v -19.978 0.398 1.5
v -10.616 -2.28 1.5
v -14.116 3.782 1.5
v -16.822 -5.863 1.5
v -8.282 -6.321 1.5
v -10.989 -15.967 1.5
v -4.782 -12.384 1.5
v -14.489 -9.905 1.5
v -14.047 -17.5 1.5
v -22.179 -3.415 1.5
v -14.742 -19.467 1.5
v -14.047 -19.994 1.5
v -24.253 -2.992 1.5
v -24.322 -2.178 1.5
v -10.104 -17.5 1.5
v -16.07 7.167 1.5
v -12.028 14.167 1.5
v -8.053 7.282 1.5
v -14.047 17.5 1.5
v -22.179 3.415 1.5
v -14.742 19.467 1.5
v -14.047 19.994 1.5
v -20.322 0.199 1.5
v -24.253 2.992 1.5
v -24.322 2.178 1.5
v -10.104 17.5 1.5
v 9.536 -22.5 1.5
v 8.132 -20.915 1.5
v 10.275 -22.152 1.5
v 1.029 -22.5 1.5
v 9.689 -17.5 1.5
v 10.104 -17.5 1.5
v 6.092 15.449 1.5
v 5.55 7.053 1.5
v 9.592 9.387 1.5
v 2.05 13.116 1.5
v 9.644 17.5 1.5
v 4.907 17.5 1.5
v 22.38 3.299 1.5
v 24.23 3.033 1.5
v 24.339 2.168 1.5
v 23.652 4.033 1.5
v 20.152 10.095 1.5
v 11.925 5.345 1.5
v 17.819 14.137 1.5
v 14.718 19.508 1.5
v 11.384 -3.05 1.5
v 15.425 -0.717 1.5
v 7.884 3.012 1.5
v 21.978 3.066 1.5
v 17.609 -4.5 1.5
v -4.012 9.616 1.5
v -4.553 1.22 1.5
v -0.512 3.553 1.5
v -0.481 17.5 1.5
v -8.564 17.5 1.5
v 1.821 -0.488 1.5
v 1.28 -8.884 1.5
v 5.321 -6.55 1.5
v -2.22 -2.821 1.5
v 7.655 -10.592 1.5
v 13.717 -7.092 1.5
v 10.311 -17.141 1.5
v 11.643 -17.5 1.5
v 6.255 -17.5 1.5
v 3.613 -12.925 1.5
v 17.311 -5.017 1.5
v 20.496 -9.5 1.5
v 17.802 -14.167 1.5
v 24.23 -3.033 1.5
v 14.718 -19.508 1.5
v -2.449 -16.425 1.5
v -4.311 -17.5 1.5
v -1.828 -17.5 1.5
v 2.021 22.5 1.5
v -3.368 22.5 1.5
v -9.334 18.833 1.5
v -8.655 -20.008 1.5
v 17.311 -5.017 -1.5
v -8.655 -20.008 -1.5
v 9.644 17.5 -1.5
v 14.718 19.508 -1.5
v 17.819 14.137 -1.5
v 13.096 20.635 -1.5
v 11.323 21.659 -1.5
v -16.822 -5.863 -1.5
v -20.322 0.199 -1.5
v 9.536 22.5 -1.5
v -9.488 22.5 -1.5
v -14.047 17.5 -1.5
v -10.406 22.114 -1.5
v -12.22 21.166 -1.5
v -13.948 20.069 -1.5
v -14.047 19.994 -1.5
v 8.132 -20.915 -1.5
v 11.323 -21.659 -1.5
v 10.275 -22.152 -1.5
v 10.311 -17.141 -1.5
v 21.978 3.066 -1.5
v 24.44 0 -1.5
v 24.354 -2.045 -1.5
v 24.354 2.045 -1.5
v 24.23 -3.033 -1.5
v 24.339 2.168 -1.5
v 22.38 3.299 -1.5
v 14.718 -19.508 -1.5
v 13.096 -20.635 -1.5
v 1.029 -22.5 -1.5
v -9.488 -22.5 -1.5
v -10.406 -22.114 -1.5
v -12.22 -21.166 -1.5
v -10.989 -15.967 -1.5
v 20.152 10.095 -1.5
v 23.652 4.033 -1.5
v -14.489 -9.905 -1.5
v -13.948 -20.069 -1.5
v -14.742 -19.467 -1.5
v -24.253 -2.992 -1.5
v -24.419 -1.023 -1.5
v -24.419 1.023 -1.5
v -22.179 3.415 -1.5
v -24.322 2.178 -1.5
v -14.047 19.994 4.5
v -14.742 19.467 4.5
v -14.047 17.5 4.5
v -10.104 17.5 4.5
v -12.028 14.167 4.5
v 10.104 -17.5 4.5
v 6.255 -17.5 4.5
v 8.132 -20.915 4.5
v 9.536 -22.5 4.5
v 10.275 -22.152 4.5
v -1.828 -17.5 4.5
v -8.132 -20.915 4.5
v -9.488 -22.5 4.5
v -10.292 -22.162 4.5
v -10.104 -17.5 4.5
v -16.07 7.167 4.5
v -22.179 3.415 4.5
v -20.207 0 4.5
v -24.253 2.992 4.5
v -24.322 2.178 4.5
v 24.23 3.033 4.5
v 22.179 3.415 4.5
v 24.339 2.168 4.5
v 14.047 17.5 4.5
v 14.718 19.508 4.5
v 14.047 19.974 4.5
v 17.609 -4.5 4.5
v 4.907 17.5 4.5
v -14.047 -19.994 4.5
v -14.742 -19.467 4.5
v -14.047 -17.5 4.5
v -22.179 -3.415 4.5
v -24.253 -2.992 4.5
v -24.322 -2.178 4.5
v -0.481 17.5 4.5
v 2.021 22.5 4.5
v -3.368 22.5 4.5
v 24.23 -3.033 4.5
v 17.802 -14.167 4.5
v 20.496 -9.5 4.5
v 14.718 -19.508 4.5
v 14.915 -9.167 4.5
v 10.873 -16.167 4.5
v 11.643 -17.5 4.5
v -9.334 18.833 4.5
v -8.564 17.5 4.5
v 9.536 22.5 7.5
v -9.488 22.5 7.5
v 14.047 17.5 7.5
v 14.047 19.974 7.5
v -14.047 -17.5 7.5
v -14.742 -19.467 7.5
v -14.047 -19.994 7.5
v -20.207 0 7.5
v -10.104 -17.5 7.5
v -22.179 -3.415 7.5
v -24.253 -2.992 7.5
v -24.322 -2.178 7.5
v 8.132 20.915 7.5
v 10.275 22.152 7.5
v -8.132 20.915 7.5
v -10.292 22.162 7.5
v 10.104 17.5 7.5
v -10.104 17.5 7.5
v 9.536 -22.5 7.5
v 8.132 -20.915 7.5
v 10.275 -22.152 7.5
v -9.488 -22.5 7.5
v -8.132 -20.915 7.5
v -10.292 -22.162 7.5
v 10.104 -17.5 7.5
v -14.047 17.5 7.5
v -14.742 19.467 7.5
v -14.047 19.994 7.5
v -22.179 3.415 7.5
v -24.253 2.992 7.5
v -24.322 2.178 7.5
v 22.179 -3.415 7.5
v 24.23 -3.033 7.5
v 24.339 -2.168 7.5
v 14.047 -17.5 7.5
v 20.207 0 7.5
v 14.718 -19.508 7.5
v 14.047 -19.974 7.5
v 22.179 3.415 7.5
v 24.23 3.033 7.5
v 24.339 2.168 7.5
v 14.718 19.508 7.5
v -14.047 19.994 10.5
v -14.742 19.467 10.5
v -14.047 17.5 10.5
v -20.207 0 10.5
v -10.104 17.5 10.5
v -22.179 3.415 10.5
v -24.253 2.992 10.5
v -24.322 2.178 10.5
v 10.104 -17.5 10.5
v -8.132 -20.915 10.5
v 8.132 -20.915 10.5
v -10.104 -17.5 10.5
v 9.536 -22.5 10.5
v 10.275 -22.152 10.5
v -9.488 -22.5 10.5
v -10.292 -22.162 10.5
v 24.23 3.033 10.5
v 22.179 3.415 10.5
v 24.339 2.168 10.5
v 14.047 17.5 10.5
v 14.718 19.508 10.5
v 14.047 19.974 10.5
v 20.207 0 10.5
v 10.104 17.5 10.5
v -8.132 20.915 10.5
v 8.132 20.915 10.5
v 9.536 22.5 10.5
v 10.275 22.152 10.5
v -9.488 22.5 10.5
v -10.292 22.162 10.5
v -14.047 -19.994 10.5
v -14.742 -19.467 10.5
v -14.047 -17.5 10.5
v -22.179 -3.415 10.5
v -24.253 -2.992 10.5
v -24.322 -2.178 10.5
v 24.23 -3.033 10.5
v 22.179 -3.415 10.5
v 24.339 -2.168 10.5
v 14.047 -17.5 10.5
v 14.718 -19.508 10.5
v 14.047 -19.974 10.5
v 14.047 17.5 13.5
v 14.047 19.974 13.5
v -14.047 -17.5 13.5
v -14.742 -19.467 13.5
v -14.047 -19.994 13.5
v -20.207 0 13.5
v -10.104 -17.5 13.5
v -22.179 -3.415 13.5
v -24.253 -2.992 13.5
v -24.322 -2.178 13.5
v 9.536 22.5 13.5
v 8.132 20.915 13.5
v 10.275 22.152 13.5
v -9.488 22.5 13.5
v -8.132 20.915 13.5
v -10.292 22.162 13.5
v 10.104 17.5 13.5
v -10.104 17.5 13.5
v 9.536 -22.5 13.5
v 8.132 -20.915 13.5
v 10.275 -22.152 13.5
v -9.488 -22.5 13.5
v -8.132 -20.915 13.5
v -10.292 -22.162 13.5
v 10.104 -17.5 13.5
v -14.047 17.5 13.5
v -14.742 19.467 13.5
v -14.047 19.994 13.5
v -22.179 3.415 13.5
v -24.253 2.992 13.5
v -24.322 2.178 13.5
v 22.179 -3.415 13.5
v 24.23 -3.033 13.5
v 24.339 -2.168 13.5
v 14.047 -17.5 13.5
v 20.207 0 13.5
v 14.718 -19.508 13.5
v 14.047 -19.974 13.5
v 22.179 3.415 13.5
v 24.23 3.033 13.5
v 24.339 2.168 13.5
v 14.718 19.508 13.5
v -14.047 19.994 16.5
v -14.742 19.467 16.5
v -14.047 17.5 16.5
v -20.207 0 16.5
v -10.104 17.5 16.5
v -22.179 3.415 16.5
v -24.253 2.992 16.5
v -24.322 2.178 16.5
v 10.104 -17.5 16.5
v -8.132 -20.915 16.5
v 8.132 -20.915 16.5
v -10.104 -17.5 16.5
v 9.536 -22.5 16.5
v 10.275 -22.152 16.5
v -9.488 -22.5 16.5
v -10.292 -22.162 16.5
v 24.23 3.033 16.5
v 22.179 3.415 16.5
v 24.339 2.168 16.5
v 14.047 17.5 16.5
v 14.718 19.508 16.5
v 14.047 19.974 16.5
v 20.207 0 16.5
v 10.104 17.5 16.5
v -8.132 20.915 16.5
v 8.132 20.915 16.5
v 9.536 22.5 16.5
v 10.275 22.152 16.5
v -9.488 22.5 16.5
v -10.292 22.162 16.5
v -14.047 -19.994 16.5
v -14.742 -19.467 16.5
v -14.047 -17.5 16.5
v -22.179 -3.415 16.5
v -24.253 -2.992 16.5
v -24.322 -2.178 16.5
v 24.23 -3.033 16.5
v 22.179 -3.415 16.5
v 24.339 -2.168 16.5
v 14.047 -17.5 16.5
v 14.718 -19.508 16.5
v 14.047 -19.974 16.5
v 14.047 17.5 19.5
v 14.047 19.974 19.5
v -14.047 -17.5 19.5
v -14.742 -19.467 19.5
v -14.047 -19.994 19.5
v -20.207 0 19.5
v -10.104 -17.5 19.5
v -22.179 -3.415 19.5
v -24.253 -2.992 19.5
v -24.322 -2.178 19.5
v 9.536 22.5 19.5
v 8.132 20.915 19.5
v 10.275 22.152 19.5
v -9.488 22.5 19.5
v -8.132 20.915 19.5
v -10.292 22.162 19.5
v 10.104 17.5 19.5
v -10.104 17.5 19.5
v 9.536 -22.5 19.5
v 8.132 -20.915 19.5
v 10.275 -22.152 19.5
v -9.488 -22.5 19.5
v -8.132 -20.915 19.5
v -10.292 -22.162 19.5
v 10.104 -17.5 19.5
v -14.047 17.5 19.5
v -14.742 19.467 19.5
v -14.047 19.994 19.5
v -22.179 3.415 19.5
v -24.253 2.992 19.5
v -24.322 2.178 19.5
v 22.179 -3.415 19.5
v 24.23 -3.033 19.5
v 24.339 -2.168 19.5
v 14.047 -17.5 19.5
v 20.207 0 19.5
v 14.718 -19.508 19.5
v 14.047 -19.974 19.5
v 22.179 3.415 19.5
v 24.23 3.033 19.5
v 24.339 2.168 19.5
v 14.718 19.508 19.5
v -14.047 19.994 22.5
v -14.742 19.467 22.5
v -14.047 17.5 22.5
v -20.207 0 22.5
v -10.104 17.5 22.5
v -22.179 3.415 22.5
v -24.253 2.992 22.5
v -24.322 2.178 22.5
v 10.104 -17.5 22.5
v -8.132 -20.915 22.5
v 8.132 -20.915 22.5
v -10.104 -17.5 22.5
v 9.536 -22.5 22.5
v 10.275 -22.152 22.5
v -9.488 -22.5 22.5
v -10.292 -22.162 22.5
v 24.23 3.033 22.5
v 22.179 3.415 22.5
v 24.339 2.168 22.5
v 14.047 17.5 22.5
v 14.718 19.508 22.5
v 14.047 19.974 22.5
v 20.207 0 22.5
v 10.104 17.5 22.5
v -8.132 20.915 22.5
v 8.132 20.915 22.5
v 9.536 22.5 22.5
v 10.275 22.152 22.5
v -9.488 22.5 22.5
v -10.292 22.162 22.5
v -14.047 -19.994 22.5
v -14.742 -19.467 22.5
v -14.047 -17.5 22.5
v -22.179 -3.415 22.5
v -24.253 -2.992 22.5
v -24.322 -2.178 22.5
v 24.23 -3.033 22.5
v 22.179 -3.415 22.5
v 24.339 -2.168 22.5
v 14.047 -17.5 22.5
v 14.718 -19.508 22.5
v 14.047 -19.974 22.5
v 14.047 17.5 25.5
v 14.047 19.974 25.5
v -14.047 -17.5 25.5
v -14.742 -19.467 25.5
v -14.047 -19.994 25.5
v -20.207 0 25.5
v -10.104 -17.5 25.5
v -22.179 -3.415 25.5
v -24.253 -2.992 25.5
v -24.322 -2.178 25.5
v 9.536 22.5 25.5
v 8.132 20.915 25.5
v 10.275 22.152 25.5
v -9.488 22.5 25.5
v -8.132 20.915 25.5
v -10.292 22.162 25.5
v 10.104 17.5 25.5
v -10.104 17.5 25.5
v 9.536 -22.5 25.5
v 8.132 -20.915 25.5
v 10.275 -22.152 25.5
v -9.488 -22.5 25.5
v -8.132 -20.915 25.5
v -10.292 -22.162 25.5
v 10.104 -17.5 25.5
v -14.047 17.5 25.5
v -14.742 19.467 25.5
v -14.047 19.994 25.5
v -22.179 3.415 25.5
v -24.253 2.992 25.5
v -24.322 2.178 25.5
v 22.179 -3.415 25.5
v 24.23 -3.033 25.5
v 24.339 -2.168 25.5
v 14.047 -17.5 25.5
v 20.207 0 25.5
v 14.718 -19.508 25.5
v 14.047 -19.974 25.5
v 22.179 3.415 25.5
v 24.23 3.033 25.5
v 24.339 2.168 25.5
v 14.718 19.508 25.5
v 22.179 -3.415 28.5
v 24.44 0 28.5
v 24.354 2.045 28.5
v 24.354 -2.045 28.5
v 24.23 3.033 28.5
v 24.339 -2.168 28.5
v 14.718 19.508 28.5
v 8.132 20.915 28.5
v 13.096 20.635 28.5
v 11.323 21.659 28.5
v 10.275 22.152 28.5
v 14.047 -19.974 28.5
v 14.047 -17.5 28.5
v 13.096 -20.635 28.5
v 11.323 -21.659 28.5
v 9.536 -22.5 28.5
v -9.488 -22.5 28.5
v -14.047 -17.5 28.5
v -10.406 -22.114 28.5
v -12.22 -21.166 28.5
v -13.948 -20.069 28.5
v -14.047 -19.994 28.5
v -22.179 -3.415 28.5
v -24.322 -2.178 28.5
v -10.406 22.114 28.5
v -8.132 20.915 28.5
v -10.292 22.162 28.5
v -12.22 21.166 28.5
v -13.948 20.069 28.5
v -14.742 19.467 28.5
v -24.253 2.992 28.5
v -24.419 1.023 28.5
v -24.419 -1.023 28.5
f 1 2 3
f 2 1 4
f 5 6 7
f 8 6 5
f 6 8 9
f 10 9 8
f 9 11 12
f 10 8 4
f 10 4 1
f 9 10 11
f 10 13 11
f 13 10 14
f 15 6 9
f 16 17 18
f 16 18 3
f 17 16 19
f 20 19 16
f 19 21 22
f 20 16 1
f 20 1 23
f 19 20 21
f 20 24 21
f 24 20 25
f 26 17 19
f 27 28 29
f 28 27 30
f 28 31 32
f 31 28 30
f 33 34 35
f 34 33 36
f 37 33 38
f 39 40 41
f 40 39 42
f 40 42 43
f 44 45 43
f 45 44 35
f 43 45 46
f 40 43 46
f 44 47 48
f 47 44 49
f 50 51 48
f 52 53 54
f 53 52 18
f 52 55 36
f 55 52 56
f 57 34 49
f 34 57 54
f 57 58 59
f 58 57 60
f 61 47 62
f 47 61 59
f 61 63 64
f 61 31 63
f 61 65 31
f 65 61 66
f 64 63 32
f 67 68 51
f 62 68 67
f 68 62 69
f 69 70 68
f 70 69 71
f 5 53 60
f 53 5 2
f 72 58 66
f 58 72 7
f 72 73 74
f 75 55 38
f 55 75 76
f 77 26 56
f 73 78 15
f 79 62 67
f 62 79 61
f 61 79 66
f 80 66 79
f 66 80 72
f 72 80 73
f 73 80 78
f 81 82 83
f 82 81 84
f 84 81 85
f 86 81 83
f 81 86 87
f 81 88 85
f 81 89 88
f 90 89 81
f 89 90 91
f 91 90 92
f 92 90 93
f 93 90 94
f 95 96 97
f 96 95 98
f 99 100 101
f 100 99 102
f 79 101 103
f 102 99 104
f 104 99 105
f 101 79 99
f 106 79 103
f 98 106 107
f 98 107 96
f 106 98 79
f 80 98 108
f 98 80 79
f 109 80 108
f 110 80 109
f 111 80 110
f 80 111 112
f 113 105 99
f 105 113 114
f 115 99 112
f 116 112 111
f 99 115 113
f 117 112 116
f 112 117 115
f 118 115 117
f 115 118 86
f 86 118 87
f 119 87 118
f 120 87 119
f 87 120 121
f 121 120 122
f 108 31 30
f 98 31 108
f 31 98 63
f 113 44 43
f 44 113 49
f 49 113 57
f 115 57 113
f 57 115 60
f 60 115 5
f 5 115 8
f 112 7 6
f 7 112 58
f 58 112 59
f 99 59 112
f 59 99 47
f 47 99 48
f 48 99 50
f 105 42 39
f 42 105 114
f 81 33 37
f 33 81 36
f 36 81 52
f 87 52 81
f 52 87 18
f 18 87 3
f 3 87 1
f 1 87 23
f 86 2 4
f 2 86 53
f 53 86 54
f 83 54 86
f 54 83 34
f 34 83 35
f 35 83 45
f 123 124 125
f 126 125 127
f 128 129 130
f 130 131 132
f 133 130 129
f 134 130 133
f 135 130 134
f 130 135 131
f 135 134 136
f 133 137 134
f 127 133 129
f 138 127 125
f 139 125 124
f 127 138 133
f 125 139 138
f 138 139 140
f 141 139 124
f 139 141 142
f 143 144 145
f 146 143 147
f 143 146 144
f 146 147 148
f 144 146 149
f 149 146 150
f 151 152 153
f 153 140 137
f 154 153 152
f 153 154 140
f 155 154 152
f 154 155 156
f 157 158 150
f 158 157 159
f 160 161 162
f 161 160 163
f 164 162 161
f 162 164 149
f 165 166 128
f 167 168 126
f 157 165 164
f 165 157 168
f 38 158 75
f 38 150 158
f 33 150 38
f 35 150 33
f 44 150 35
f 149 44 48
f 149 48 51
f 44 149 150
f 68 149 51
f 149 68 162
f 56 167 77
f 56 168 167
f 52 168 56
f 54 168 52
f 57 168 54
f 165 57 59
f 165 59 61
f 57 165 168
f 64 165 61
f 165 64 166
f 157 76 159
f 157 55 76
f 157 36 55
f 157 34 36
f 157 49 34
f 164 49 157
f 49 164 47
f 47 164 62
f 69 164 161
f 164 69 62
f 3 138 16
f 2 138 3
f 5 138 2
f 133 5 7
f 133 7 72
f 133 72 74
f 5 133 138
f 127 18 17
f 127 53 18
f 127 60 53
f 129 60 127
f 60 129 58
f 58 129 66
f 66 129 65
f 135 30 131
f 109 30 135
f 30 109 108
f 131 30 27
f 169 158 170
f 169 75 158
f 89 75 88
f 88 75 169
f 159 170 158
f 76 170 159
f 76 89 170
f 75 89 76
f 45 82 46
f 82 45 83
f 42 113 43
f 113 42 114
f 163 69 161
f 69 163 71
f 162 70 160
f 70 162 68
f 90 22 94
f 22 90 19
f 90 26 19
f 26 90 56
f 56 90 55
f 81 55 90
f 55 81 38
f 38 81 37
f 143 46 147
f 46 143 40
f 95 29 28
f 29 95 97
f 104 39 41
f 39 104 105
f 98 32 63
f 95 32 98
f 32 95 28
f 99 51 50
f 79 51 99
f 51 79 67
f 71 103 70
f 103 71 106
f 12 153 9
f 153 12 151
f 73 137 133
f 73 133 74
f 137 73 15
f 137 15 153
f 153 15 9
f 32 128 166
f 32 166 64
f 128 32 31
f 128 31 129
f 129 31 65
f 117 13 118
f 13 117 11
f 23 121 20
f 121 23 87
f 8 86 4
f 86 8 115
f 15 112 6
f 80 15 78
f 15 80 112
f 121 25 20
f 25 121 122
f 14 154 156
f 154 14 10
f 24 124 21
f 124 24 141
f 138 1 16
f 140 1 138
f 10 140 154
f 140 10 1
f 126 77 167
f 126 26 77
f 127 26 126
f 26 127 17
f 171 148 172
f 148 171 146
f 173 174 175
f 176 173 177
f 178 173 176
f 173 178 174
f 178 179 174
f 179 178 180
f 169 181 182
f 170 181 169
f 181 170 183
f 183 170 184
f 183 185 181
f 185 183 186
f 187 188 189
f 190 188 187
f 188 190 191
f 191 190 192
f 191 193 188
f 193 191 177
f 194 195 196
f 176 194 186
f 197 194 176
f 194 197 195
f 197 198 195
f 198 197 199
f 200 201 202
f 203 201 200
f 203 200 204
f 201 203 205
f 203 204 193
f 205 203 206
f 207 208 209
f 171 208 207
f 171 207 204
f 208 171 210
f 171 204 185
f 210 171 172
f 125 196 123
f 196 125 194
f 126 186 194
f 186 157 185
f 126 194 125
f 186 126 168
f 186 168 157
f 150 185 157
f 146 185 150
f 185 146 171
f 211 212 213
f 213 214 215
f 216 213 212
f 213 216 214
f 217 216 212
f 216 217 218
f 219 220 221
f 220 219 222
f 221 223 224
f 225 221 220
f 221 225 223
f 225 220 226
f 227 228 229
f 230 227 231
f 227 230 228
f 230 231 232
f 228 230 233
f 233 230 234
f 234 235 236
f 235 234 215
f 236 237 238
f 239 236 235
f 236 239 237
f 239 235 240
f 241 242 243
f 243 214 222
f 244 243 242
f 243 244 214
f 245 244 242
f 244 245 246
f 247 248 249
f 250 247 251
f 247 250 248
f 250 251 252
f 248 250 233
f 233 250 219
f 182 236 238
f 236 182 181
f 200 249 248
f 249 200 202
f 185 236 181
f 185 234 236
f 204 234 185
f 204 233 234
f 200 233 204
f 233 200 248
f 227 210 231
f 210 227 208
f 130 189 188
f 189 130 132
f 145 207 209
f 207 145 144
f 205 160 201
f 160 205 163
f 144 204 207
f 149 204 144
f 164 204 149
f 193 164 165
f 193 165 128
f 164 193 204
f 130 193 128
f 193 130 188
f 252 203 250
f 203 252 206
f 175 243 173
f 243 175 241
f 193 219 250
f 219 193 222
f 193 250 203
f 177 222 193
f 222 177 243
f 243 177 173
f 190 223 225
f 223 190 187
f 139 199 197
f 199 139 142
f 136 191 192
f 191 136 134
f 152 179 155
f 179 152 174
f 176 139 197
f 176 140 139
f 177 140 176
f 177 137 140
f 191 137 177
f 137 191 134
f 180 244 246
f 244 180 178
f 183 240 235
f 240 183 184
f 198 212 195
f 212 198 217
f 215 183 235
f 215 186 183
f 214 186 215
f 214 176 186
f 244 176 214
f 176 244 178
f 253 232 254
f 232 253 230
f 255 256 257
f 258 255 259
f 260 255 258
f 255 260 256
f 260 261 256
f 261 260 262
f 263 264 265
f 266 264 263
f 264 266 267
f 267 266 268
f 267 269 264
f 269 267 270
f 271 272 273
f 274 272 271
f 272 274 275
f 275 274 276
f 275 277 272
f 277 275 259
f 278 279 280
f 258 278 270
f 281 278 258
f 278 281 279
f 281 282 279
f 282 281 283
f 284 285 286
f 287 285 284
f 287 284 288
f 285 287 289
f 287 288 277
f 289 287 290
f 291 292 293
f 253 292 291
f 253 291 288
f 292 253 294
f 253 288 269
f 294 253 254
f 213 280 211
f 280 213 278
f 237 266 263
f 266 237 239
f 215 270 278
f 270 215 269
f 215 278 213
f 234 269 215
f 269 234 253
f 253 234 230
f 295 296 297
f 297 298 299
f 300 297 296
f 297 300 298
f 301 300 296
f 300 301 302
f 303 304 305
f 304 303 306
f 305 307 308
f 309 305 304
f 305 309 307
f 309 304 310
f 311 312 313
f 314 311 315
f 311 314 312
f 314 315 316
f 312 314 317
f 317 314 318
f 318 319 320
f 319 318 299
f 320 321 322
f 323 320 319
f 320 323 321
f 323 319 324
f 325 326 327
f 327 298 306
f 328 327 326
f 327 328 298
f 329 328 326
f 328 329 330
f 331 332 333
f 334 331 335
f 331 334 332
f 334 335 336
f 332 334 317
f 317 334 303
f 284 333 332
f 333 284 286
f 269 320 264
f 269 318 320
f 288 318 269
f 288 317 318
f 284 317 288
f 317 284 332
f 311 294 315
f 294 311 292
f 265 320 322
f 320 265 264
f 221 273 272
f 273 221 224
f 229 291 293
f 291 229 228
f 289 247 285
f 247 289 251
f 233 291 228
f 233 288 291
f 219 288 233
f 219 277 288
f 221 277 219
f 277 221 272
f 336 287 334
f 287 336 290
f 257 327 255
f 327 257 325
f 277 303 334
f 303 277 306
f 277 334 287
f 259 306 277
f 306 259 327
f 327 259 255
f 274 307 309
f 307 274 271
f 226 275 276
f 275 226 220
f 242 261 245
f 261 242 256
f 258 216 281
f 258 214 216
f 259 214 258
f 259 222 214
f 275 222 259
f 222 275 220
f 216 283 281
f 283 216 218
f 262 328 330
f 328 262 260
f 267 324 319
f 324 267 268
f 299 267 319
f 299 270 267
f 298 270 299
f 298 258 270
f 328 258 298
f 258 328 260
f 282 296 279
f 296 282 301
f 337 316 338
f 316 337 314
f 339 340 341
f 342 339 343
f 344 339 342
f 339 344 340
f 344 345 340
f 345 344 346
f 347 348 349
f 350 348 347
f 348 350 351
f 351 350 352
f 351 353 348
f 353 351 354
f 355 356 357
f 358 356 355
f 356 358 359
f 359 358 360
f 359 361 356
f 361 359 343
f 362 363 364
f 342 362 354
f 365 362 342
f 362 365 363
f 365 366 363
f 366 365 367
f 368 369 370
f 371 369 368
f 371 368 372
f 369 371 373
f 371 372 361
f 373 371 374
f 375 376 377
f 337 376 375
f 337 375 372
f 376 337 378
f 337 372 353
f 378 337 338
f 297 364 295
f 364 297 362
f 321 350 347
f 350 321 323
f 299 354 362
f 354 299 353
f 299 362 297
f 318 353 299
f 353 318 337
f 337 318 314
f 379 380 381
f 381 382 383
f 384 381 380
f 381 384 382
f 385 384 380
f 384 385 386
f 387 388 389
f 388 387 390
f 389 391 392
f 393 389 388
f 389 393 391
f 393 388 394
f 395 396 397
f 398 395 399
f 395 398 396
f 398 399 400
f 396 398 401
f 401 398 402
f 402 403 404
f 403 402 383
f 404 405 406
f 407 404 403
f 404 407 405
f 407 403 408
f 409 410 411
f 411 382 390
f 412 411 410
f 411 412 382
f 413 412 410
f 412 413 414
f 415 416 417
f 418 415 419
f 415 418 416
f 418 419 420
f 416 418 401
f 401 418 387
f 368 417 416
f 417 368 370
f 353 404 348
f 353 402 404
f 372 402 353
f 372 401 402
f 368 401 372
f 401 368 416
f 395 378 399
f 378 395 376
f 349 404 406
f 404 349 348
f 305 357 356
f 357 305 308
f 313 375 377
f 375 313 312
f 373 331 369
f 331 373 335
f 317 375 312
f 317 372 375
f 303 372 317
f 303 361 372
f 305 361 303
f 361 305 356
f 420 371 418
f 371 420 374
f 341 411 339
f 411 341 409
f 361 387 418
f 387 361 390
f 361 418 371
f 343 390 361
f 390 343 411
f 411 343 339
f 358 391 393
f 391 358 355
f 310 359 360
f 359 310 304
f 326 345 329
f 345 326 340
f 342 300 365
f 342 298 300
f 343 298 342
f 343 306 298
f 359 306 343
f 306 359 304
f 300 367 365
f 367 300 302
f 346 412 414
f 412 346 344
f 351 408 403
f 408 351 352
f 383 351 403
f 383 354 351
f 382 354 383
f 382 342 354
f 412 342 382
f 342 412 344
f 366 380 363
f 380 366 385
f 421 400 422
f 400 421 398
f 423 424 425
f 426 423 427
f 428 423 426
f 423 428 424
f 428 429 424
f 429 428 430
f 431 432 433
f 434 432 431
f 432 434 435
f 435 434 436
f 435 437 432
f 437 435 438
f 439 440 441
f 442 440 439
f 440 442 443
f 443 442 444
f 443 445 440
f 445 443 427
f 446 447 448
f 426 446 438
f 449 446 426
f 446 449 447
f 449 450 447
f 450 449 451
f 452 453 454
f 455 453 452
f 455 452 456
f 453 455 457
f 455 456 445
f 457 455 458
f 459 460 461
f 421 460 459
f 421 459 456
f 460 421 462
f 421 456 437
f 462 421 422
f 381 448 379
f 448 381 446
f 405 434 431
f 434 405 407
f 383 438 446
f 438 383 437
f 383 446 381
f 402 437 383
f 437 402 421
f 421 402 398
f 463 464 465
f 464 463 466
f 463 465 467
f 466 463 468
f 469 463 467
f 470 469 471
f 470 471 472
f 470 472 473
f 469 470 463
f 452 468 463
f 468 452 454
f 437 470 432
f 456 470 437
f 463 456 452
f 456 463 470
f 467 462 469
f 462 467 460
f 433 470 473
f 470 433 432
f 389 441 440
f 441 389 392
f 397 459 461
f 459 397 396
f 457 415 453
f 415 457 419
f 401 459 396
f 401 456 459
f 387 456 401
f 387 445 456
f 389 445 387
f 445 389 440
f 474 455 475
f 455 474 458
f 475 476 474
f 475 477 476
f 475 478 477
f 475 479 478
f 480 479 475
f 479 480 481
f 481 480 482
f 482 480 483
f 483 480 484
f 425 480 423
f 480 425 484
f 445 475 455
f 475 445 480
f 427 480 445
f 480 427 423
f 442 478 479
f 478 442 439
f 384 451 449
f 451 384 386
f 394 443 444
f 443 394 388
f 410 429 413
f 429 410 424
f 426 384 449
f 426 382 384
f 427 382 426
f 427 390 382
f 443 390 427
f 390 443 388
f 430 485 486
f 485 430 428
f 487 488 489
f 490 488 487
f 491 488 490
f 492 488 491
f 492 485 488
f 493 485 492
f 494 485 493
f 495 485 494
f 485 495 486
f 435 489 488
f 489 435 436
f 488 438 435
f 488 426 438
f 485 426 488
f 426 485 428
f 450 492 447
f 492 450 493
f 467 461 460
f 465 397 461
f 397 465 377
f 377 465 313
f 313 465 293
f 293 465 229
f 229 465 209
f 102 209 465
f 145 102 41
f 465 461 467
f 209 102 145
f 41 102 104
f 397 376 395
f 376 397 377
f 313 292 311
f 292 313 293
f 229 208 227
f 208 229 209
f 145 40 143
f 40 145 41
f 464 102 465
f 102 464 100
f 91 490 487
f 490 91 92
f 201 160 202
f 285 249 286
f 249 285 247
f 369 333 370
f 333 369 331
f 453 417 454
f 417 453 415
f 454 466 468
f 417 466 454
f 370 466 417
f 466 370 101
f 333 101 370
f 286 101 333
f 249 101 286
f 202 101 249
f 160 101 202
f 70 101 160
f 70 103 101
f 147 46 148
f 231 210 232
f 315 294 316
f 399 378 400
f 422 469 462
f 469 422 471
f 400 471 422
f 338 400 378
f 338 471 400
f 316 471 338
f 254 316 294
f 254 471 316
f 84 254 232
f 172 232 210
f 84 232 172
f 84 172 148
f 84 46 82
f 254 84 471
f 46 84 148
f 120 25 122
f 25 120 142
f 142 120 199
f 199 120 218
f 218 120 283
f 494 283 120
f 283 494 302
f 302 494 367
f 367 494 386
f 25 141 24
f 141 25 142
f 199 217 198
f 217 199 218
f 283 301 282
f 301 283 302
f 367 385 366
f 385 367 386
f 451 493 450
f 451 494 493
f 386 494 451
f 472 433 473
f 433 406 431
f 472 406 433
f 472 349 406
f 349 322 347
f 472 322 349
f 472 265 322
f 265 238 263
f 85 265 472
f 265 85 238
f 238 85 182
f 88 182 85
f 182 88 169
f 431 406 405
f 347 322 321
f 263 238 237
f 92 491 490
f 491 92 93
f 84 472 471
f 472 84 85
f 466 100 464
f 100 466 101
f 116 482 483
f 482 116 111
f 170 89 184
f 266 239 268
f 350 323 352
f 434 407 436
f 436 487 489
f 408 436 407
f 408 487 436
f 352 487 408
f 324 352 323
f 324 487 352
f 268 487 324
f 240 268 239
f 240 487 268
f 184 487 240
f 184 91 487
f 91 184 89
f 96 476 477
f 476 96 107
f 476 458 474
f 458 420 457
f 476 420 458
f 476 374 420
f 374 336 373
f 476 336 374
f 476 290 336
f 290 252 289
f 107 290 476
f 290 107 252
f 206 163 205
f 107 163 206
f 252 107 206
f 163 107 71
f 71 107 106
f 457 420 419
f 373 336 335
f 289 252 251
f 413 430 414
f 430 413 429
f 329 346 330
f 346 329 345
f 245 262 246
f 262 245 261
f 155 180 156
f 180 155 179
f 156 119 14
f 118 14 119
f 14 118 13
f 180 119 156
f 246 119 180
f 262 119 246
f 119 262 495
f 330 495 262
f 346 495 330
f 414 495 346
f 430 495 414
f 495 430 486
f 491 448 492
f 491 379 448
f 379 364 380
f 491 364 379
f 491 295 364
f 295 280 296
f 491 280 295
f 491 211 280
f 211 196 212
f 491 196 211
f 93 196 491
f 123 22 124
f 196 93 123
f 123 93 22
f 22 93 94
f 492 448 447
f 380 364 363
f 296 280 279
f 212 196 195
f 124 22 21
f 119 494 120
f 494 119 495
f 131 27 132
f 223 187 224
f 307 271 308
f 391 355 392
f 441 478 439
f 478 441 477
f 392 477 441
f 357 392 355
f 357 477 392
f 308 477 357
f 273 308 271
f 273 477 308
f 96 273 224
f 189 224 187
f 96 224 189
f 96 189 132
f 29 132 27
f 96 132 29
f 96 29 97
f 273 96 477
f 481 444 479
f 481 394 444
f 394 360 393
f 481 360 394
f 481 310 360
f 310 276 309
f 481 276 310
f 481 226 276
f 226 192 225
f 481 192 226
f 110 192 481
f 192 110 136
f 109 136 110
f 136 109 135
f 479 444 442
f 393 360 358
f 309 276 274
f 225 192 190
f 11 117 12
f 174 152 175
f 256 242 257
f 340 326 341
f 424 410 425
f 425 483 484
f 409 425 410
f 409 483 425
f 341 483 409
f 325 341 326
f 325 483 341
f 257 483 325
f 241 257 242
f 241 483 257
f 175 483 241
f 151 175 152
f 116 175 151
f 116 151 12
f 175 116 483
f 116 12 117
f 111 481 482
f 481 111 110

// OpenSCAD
$fn = 75;

difference() {
	union() {
		union() {
			union() {
				union() {
					union() {
						union() {
							union() {
								union() {
									union() {
										union() {
											union() {
												union() {
													union() {
														union() {
															union() {
																union() {
																	union() {
																		union() {
																			union() {
																				union() {
																					union() {
																						union() {
																							union() {
																								union() {
																									union() {
																										union() {
																											union() {
																												union() {
																													union() {
																														union() {
																															difference() {
																																union() {
																																	union() {
																																		union() {
																																			union() {
																																				union() {
																																					union() {
																																						rotate(a = 30.0000000000) {
																																							translate(v = [0, -16.5000000000, 0.0000000000]) {
																																								cube(center = true, size = [67.0000000000, 7.0000000000, 3.0000000000]);
																																							}
																																						}
																																					}
																																					rotate(a = 30.0000000000) {
																																						translate(v = [0, -4.8333333333, 0.0000000000]) {
																																							cube(center = true, size = [67.0000000000, 7.0000000000, 3.0000000000]);
																																						}
																																					}
																																				}
																																				rotate(a = 30.0000000000) {
																																					translate(v = [0, 6.8333333333, 0.0000000000]) {
																																						cube(center = true, size = [67.0000000000, 7.0000000000, 3.0000000000]);
																																					}
																																				}
																																			}
																																			rotate(a = 120.0000000000) {
																																				translate(v = [0, -16.5000000000, 3.0000000000]) {
																																					cube(center = true, size = [67.0000000000, 7.0000000000, 3.0000000000]);
																																				}
																																			}
																																		}
																																		rotate(a = 120.0000000000) {
																																			translate(v = [0, -4.8333333333, 3.0000000000]) {
																																				cube(center = true, size = [67.0000000000, 7.0000000000, 3.0000000000]);
																																			}
																																		}
																																	}
																																	rotate(a = 120.0000000000) {
																																		translate(v = [0, 6.8333333333, 3.0000000000]) {
																																			cube(center = true, size = [67.0000000000, 7.0000000000, 3.0000000000]);
																																		}
																																	}
																																}
																																difference() {
																																	cube(center = true, size = [80, 97.7603895452, 60]);
																																	rotate(a = -90.0000000000) {
																																		cube(center = true, size = [45.0000000000, 48.8801947726, 90]);
																																	}
																																}
																																difference() {
																																	cube(center = true, size = [80, 97.7603895452, 60]);
																																	rotate(a = 30.0000000000) {
																																		cube(center = true, size = [45.0000000000, 48.8801947726, 90]);
																																	}
																																}
																																difference() {
																																	cube(center = true, size = [80, 97.7603895452, 60]);
																																	rotate(a = 150.0000000000) {
																																		cube(center = true, size = [45.0000000000, 48.8801947726, 90]);
																																	}
																																}
																																difference() {
																																	cube(center = true, size = [80, 97.7603895452, 60]);
																																	rotate(a = 270.0000000000) {
																																		cube(center = true, size = [45.0000000000, 48.8801947726, 90]);
																																	}
																																}
																																difference() {
																																	cube(center = true, size = [80, 97.7603895452, 60]);
																																	rotate(a = 390.0000000000) {
																																		cube(center = true, size = [45.0000000000, 48.8801947726, 90]);
																																	}
																																}
																																difference() {
																																	cube(center = true, size = [80, 97.7603895452, 60]);
																																	rotate(a = 510.0000000000) {
																																		cube(center = true, size = [45.0000000000, 48.8801947726, 90]);
																																	}
																																}
																															}
																															rotate(a = 0.0000000000) {
																																translate(v = [0, 20, 0.0000000000]) {
																																	cube(center = true, size = [28.0940107676, 5, 3.0000000000]);
																																}
																															}
																														}
																														rotate(a = 120.0000000000) {
																															translate(v = [0, -20, 3.0000000000]) {
																																cube(center = true, size = [28.0940107676, 5, 3.0000000000]);
																															}
																														}
																													}
																													rotate(a = 240.0000000000) {
																														translate(v = [0, 20, 0.0000000000]) {
																															cube(center = true, size = [28.0940107676, 5, 3.0000000000]);
																														}
																													}
																												}
																												rotate(a = 360.0000000000) {
																													translate(v = [0, -20, 3.0000000000]) {
																														cube(center = true, size = [28.0940107676, 5, 3.0000000000]);
																													}
																												}
																											}
																											rotate(a = 480.0000000000) {
																												translate(v = [0, 20, 0.0000000000]) {
																													cube(center = true, size = [28.0940107676, 5, 3.0000000000]);
																												}
																											}
																										}
																										rotate(a = 600.0000000000) {
																											translate(v = [0, -20, 3.0000000000]) {
																												cube(center = true, size = [28.0940107676, 5, 3.0000000000]);
																											}
																										}
																									}
																									rotate(a = 0.0000000000) {
																										translate(v = [0, 20, 6.0000000000]) {
																											cube(center = true, size = [28.0940107676, 5, 3.0000000000]);
																										}
																									}
																								}
																								rotate(a = 120.0000000000) {
																									translate(v = [0, -20, 9.0000000000]) {
																										cube(center = true, size = [28.0940107676, 5, 3.0000000000]);
																									}
																								}
																							}
																							rotate(a = 240.0000000000) {
																								translate(v = [0, 20, 6.0000000000]) {
																									cube(center = true, size = [28.0940107676, 5, 3.0000000000]);
																								}
																							}
																						}
																						rotate(a = 360.0000000000) {
																							translate(v = [0, -20, 9.0000000000]) {
																								cube(center = true, size = [28.0940107676, 5, 3.0000000000]);
																							}
																						}
																					}
																					rotate(a = 480.0000000000) {
																						translate(v = [0, 20, 6.0000000000]) {
																							cube(center = true, size = [28.0940107676, 5, 3.0000000000]);
																						}
																					}
																				}
																				rotate(a = 600.0000000000) {
																					translate(v = [0, -20, 9.0000000000]) {
																						cube(center = true, size = [28.0940107676, 5, 3.0000000000]);
																					}
																				}
																			}
																			rotate(a = 0.0000000000) {
																				translate(v = [0, 20, 12.0000000000]) {
																					cube(center = true, size = [28.0940107676, 5, 3.0000000000]);
																				}
																			}
																		}
																		rotate(a = 120.0000000000) {
																			translate(v = [0, -20, 15.0000000000]) {
																				cube(center = true, size = [28.0940107676, 5, 3.0000000000]);
																			}
																		}
																	}
																	rotate(a = 240.0000000000) {
																		translate(v = [0, 20, 12.0000000000]) {
																			cube(center = true, size = [28.0940107676, 5, 3.0000000000]);
																		}
																	}
																}
																rotate(a = 360.0000000000) {
																	translate(v = [0, -20, 15.0000000000]) {
																		cube(center = true, size = [28.0940107676, 5, 3.0000000000]);
																	}
																}
															}
															rotate(a = 480.0000000000) {
																translate(v = [0, 20, 12.0000000000]) {
																	cube(center = true, size = [28.0940107676, 5, 3.0000000000]);
																}
															}
														}
														rotate(a = 600.0000000000) {
															translate(v = [0, -20, 15.0000000000]) {
																cube(center = true, size = [28.0940107676, 5, 3.0000000000]);
															}
														}
													}
													rotate(a = 0.0000000000) {
														translate(v = [0, 20, 18.0000000000]) {
															cube(center = true, size = [28.0940107676, 5, 3.0000000000]);
														}
													}
												}
												rotate(a = 120.0000000000) {
													translate(v = [0, -20, 21.0000000000]) {
														cube(center = true, size = [28.0940107676, 5, 3.0000000000]);
													}
												}
											}
											rotate(a = 240.0000000000) {
												translate(v = [0, 20, 18.0000000000]) {
													cube(center = true, size = [28.0940107676, 5, 3.0000000000]);
												}
											}
										}
										rotate(a = 360.0000000000) {
											translate(v = [0, -20, 21.0000000000]) {
												cube(center = true, size = [28.0940107676, 5, 3.0000000000]);
											}
										}
									}
									rotate(a = 480.0000000000) {
										translate(v = [0, 20, 18.0000000000]) {
											cube(center = true, size = [28.0940107676, 5, 3.0000000000]);
										}
									}
								}
								rotate(a = 600.0000000000) {
									translate(v = [0, -20, 21.0000000000]) {
										cube(center = true, size = [28.0940107676, 5, 3.0000000000]);
									}
								}
							}
							rotate(a = 0.0000000000) {
								translate(v = [0, 20, 24.0000000000]) {
									cube(center = true, size = [28.0940107676, 5, 3.0000000000]);
								}
							}
						}
						rotate(a = 120.0000000000) {
							translate(v = [0, -20, 27.0000000000]) {
								cube(center = true, size = [28.0940107676, 5, 3.0000000000]);
							}
						}
					}
					rotate(a = 240.0000000000) {
						translate(v = [0, 20, 24.0000000000]) {
							cube(center = true, size = [28.0940107676, 5, 3.0000000000]);
						}
					}
				}
				rotate(a = 360.0000000000) {
					translate(v = [0, -20, 27.0000000000]) {
						cube(center = true, size = [28.0940107676, 5, 3.0000000000]);
					}
				}
			}
			rotate(a = 480.0000000000) {
				translate(v = [0, 20, 24.0000000000]) {
					cube(center = true, size = [28.0940107676, 5, 3.0000000000]);
				}
			}
		}
		rotate(a = 600.0000000000) {
			translate(v = [0, -20, 27.0000000000]) {
				cube(center = true, size = [28.0940107676, 5, 3.0000000000]);
			}
		}
	}
	difference() {
		cylinder(center = true, h = 120, r = 48.8801947726);
		cylinder(center = true, h = 150, r = 24.4400973863);
	}
}
/***********************************************
*********      SolidPython code:      **********
************************************************
 
#! /usr/bin/env python
# -*- coding: UTF-8 -*-
from __future__ import division
import os
import sys
import re
import math

# Assumes SolidPython is in site-packages or elsewhere in sys.path
from solid import *
from solid.utils import *

SEGMENTS = 75

def calcDimensions(radius=25, height=35, wall_thickness=7, sides=6, layers=5, roundEdges=False, leveledTop=True, overlap=1.25):
    blockLength = 2*radius*tan(math.pi/sides)
    blockWidth = wall_thickness
    blockHeight = height/layers/2
    blockAngle = 180*(sides-2)/sides

    if sides == 3: # calculate vertex to vertex distance if it's a triangle
        VertexToVertex = radius*2

    elif sides == 4: # if it's a square
        VertexToVertex = math.sqrt(radius**2 + radius**2)

    else: # if it's any other type of normal polygon
        VertexToVertex = math.sqrt(radius**2 + (blockLength/2+(blockWidth/2*overlap))**2)

    block = []
    # pot bottom
    floorThickness = wall_thickness*1.4
    planks = math.ceil(radius*2.05/floorThickness)
    for l in range(2):
        for p in range(planks):
            if (p%2 == 0):
                newSide = rotate(a=blockAngle-90+l*90)(translate([0,floorThickness*p*(1-(1/planks))-radius+floorThickness/2,l*blockHeight])(cube([radius*3+(floorThickness*overlap),floorThickness,blockHeight], center = True)))
                block = union()(block,newSide)

    #remove excess floor planks
    excess = []
    excessOuter = (cube([radius*4, VertexToVertex*4, height*2], center=True))
    for e in range(math.ceil(sides)):
        excessInner = rotate(blockAngle*e-90)(cube([radius*2+blockWidth*overlap, VertexToVertex*2, height*3], center=True))
        excess = excessOuter - excessInner
        block = block - excess
        #excess = excessInner+excess

    for l in range(layers): # Sides of the pot
        for s in range(sides): #Generate layers
            if (l == layers-1) and leveledTop == True: #if it's the top layer and leveledTop is true
                if (s%2 == 0): # if side iter is even
                    newSide = rotate(a=blockAngle*s)(translate([0,radius,blockHeight*l*2])(cube([blockLength+(blockWidth*overlap),blockWidth,blockHeight], center = True)))
                    block = union()(block,newSide)

                elif (s%2 > 0): # else side iter is odd
                    newSide = rotate(a=blockAngle*s)(translate([0,radius*-1,blockHeight*l*2])(cube([blockLength+(blockWidth*overlap),blockWidth,blockHeight], center = True)))
                    block = union()(block,newSide)

            elif (s%2 == 0): # if side iter is even
                newSide = rotate(a=blockAngle*s)(translate([0,radius,blockHeight*l*2])(cube([blockLength+(blockWidth*overlap),blockWidth,blockHeight], center = True)))
                block = union()(block,newSide)
            elif (s%2 > 0): # else side iter is odd
                newSide = rotate(a=blockAngle*s)(translate([0,radius*-1,blockHeight*l*2+blockHeight])(cube([blockLength+(blockWidth*overlap),blockWidth,blockHeight], center = True)))
                block = union()(block,newSide)

    if roundEdges == True:
        innerCyl = cylinder(r=VertexToVertex, h=height*5, center= True)
        outerCyl = cylinder(r=VertexToVertex*2, h=height*4, center= True)
        outerCyl = outerCyl - innerCyl
        block = block - outerCyl
    return block

woodpot = calcDimensions(radius=20,height=30,wall_thickness=5,sides=6,layers=5,roundEdges=True, leveledTop=False,overlap=1.0)
if __name__ == '__main__':
    out_dir = sys.argv[1] if len(sys.argv) > 1 else os.curdir
    file_out = os.path.join(out_dir, 'woodpot.scad')

    print("%(__file__)s: SCAD file written to: \n%(file_out)s" % vars())

    scad_render_to_file(woodpot, file_out, file_header='$fn = %s;' % SEGMENTS, include_orig_code=True)
 
 
************************************************/
